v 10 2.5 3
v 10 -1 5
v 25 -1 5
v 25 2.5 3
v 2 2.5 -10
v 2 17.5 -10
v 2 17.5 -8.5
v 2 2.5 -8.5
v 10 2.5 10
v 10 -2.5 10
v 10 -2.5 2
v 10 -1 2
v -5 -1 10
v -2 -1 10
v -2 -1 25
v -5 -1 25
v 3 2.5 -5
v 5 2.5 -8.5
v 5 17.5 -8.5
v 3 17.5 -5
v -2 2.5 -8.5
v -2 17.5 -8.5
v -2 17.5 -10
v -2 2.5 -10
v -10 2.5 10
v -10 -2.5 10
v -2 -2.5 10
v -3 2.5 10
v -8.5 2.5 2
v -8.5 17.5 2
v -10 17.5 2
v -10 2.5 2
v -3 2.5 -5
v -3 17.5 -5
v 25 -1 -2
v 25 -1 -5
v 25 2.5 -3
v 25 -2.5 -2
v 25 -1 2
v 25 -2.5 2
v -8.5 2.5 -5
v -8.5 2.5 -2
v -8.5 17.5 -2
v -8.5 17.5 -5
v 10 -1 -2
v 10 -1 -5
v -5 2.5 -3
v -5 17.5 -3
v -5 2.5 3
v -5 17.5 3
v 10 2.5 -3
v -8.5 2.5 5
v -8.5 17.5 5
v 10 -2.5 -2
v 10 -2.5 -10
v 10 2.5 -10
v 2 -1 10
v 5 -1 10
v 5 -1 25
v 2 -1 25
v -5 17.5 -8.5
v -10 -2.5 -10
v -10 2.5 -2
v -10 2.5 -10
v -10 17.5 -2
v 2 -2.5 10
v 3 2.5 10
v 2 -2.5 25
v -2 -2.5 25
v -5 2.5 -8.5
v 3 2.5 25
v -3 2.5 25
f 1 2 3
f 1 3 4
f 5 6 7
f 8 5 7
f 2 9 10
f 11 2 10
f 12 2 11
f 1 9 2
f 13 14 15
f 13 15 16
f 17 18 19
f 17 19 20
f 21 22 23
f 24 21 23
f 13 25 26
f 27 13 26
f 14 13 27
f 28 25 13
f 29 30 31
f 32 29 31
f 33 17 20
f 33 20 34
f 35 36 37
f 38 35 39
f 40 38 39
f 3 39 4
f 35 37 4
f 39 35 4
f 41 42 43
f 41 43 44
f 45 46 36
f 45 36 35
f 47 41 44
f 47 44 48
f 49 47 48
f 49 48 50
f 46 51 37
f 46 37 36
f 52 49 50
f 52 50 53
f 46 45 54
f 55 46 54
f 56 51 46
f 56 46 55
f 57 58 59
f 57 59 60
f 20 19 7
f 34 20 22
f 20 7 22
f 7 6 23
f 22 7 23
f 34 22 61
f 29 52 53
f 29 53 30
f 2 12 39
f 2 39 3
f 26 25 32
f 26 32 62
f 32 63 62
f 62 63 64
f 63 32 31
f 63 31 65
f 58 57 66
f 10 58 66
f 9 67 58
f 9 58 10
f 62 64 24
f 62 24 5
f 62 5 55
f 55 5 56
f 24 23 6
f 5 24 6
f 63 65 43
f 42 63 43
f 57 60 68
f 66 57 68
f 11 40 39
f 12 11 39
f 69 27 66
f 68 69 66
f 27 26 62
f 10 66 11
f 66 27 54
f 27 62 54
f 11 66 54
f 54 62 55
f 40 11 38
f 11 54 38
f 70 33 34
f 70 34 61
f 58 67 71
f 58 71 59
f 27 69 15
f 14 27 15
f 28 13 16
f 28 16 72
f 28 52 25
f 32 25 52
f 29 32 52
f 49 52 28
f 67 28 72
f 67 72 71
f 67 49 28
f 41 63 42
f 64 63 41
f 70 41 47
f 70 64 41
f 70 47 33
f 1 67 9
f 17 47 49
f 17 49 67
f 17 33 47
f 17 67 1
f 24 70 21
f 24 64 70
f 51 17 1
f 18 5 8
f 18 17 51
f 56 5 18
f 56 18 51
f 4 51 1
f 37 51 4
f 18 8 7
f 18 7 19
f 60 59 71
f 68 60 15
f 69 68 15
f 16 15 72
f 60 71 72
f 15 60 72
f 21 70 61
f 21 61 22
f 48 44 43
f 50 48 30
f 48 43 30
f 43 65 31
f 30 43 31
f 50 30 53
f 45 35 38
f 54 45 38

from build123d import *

# Parameters (mm, degrees)
SKETCH1_W           = 20
SKETCH1_H           = 20
BOSS_EXTRUDE1_DEPTH = 2.5
BOSS_EXTRUDE2_DEPTH = 15
CIRPATTERN1_COUNT   = 2
CIRPATTERN1_ANGLE   = 90
BOSS_EXTRUDE3_DEPTH = 15
CIRPATTERN2_COUNT   = 2
CIRPATTERN2_ANGLE   = 90


with BuildPart() as part:
    # Sketch1 → Boss-Extrude1 (new, symmetric)
    with BuildSketch(Plane(origin=(0, 0, 0), x_dir=(1, 0, 0), z_dir=(0, 1, 0))):
        Rectangle(SKETCH1_W, SKETCH1_H)
    extrude(amount=BOSS_EXTRUDE1_DEPTH, both=True)

    # Sketch2 → Boss-Extrude2 (add)
    with BuildSketch(Plane(origin=(0, 2.5, 0), x_dir=(1, 0, 0), z_dir=(0, 1, 0))):
        Polygon((-2, 10), (2, 10), (2, 8.5), (5, 8.5), (3, 5), (-3, 5), (-5, 8.5), (-2, 8.5), align=None)
    boss_extrude2 = extrude(amount=BOSS_EXTRUDE2_DEPTH)

    # CirPattern1: Boss-Extrude2 ×2 about axis
    cirpattern1_axis = Axis((0, 0, 0), (0, 1, 0))
    for i in range(1, CIRPATTERN1_COUNT):
        add(boss_extrude2.rotate(cirpattern1_axis, i * CIRPATTERN1_ANGLE / (CIRPATTERN1_COUNT - 1)))

    # Sketch3 → Boss-Extrude3 (add)
    with BuildSketch(Plane(origin=(10, 0, 0), x_dir=(0, 0, -1), z_dir=(1, 0, 0))):
        Polygon((-3, 2.5), (3, 2.5), (5, -1), (2, -1), (2, -2.5), (-2, -2.5), (-2, -1), (-5, -1), align=None)
    boss_extrude3 = extrude(amount=BOSS_EXTRUDE3_DEPTH)

    # CirPattern2: Boss-Extrude3 ×2 about axis
    cirpattern2_axis = Axis((0, 0, 0), (0, -1, 0))
    for i in range(1, CIRPATTERN2_COUNT):
        add(boss_extrude3.rotate(cirpattern2_axis, i * CIRPATTERN2_ANGLE / (CIRPATTERN2_COUNT - 1)))


solid = part.part
